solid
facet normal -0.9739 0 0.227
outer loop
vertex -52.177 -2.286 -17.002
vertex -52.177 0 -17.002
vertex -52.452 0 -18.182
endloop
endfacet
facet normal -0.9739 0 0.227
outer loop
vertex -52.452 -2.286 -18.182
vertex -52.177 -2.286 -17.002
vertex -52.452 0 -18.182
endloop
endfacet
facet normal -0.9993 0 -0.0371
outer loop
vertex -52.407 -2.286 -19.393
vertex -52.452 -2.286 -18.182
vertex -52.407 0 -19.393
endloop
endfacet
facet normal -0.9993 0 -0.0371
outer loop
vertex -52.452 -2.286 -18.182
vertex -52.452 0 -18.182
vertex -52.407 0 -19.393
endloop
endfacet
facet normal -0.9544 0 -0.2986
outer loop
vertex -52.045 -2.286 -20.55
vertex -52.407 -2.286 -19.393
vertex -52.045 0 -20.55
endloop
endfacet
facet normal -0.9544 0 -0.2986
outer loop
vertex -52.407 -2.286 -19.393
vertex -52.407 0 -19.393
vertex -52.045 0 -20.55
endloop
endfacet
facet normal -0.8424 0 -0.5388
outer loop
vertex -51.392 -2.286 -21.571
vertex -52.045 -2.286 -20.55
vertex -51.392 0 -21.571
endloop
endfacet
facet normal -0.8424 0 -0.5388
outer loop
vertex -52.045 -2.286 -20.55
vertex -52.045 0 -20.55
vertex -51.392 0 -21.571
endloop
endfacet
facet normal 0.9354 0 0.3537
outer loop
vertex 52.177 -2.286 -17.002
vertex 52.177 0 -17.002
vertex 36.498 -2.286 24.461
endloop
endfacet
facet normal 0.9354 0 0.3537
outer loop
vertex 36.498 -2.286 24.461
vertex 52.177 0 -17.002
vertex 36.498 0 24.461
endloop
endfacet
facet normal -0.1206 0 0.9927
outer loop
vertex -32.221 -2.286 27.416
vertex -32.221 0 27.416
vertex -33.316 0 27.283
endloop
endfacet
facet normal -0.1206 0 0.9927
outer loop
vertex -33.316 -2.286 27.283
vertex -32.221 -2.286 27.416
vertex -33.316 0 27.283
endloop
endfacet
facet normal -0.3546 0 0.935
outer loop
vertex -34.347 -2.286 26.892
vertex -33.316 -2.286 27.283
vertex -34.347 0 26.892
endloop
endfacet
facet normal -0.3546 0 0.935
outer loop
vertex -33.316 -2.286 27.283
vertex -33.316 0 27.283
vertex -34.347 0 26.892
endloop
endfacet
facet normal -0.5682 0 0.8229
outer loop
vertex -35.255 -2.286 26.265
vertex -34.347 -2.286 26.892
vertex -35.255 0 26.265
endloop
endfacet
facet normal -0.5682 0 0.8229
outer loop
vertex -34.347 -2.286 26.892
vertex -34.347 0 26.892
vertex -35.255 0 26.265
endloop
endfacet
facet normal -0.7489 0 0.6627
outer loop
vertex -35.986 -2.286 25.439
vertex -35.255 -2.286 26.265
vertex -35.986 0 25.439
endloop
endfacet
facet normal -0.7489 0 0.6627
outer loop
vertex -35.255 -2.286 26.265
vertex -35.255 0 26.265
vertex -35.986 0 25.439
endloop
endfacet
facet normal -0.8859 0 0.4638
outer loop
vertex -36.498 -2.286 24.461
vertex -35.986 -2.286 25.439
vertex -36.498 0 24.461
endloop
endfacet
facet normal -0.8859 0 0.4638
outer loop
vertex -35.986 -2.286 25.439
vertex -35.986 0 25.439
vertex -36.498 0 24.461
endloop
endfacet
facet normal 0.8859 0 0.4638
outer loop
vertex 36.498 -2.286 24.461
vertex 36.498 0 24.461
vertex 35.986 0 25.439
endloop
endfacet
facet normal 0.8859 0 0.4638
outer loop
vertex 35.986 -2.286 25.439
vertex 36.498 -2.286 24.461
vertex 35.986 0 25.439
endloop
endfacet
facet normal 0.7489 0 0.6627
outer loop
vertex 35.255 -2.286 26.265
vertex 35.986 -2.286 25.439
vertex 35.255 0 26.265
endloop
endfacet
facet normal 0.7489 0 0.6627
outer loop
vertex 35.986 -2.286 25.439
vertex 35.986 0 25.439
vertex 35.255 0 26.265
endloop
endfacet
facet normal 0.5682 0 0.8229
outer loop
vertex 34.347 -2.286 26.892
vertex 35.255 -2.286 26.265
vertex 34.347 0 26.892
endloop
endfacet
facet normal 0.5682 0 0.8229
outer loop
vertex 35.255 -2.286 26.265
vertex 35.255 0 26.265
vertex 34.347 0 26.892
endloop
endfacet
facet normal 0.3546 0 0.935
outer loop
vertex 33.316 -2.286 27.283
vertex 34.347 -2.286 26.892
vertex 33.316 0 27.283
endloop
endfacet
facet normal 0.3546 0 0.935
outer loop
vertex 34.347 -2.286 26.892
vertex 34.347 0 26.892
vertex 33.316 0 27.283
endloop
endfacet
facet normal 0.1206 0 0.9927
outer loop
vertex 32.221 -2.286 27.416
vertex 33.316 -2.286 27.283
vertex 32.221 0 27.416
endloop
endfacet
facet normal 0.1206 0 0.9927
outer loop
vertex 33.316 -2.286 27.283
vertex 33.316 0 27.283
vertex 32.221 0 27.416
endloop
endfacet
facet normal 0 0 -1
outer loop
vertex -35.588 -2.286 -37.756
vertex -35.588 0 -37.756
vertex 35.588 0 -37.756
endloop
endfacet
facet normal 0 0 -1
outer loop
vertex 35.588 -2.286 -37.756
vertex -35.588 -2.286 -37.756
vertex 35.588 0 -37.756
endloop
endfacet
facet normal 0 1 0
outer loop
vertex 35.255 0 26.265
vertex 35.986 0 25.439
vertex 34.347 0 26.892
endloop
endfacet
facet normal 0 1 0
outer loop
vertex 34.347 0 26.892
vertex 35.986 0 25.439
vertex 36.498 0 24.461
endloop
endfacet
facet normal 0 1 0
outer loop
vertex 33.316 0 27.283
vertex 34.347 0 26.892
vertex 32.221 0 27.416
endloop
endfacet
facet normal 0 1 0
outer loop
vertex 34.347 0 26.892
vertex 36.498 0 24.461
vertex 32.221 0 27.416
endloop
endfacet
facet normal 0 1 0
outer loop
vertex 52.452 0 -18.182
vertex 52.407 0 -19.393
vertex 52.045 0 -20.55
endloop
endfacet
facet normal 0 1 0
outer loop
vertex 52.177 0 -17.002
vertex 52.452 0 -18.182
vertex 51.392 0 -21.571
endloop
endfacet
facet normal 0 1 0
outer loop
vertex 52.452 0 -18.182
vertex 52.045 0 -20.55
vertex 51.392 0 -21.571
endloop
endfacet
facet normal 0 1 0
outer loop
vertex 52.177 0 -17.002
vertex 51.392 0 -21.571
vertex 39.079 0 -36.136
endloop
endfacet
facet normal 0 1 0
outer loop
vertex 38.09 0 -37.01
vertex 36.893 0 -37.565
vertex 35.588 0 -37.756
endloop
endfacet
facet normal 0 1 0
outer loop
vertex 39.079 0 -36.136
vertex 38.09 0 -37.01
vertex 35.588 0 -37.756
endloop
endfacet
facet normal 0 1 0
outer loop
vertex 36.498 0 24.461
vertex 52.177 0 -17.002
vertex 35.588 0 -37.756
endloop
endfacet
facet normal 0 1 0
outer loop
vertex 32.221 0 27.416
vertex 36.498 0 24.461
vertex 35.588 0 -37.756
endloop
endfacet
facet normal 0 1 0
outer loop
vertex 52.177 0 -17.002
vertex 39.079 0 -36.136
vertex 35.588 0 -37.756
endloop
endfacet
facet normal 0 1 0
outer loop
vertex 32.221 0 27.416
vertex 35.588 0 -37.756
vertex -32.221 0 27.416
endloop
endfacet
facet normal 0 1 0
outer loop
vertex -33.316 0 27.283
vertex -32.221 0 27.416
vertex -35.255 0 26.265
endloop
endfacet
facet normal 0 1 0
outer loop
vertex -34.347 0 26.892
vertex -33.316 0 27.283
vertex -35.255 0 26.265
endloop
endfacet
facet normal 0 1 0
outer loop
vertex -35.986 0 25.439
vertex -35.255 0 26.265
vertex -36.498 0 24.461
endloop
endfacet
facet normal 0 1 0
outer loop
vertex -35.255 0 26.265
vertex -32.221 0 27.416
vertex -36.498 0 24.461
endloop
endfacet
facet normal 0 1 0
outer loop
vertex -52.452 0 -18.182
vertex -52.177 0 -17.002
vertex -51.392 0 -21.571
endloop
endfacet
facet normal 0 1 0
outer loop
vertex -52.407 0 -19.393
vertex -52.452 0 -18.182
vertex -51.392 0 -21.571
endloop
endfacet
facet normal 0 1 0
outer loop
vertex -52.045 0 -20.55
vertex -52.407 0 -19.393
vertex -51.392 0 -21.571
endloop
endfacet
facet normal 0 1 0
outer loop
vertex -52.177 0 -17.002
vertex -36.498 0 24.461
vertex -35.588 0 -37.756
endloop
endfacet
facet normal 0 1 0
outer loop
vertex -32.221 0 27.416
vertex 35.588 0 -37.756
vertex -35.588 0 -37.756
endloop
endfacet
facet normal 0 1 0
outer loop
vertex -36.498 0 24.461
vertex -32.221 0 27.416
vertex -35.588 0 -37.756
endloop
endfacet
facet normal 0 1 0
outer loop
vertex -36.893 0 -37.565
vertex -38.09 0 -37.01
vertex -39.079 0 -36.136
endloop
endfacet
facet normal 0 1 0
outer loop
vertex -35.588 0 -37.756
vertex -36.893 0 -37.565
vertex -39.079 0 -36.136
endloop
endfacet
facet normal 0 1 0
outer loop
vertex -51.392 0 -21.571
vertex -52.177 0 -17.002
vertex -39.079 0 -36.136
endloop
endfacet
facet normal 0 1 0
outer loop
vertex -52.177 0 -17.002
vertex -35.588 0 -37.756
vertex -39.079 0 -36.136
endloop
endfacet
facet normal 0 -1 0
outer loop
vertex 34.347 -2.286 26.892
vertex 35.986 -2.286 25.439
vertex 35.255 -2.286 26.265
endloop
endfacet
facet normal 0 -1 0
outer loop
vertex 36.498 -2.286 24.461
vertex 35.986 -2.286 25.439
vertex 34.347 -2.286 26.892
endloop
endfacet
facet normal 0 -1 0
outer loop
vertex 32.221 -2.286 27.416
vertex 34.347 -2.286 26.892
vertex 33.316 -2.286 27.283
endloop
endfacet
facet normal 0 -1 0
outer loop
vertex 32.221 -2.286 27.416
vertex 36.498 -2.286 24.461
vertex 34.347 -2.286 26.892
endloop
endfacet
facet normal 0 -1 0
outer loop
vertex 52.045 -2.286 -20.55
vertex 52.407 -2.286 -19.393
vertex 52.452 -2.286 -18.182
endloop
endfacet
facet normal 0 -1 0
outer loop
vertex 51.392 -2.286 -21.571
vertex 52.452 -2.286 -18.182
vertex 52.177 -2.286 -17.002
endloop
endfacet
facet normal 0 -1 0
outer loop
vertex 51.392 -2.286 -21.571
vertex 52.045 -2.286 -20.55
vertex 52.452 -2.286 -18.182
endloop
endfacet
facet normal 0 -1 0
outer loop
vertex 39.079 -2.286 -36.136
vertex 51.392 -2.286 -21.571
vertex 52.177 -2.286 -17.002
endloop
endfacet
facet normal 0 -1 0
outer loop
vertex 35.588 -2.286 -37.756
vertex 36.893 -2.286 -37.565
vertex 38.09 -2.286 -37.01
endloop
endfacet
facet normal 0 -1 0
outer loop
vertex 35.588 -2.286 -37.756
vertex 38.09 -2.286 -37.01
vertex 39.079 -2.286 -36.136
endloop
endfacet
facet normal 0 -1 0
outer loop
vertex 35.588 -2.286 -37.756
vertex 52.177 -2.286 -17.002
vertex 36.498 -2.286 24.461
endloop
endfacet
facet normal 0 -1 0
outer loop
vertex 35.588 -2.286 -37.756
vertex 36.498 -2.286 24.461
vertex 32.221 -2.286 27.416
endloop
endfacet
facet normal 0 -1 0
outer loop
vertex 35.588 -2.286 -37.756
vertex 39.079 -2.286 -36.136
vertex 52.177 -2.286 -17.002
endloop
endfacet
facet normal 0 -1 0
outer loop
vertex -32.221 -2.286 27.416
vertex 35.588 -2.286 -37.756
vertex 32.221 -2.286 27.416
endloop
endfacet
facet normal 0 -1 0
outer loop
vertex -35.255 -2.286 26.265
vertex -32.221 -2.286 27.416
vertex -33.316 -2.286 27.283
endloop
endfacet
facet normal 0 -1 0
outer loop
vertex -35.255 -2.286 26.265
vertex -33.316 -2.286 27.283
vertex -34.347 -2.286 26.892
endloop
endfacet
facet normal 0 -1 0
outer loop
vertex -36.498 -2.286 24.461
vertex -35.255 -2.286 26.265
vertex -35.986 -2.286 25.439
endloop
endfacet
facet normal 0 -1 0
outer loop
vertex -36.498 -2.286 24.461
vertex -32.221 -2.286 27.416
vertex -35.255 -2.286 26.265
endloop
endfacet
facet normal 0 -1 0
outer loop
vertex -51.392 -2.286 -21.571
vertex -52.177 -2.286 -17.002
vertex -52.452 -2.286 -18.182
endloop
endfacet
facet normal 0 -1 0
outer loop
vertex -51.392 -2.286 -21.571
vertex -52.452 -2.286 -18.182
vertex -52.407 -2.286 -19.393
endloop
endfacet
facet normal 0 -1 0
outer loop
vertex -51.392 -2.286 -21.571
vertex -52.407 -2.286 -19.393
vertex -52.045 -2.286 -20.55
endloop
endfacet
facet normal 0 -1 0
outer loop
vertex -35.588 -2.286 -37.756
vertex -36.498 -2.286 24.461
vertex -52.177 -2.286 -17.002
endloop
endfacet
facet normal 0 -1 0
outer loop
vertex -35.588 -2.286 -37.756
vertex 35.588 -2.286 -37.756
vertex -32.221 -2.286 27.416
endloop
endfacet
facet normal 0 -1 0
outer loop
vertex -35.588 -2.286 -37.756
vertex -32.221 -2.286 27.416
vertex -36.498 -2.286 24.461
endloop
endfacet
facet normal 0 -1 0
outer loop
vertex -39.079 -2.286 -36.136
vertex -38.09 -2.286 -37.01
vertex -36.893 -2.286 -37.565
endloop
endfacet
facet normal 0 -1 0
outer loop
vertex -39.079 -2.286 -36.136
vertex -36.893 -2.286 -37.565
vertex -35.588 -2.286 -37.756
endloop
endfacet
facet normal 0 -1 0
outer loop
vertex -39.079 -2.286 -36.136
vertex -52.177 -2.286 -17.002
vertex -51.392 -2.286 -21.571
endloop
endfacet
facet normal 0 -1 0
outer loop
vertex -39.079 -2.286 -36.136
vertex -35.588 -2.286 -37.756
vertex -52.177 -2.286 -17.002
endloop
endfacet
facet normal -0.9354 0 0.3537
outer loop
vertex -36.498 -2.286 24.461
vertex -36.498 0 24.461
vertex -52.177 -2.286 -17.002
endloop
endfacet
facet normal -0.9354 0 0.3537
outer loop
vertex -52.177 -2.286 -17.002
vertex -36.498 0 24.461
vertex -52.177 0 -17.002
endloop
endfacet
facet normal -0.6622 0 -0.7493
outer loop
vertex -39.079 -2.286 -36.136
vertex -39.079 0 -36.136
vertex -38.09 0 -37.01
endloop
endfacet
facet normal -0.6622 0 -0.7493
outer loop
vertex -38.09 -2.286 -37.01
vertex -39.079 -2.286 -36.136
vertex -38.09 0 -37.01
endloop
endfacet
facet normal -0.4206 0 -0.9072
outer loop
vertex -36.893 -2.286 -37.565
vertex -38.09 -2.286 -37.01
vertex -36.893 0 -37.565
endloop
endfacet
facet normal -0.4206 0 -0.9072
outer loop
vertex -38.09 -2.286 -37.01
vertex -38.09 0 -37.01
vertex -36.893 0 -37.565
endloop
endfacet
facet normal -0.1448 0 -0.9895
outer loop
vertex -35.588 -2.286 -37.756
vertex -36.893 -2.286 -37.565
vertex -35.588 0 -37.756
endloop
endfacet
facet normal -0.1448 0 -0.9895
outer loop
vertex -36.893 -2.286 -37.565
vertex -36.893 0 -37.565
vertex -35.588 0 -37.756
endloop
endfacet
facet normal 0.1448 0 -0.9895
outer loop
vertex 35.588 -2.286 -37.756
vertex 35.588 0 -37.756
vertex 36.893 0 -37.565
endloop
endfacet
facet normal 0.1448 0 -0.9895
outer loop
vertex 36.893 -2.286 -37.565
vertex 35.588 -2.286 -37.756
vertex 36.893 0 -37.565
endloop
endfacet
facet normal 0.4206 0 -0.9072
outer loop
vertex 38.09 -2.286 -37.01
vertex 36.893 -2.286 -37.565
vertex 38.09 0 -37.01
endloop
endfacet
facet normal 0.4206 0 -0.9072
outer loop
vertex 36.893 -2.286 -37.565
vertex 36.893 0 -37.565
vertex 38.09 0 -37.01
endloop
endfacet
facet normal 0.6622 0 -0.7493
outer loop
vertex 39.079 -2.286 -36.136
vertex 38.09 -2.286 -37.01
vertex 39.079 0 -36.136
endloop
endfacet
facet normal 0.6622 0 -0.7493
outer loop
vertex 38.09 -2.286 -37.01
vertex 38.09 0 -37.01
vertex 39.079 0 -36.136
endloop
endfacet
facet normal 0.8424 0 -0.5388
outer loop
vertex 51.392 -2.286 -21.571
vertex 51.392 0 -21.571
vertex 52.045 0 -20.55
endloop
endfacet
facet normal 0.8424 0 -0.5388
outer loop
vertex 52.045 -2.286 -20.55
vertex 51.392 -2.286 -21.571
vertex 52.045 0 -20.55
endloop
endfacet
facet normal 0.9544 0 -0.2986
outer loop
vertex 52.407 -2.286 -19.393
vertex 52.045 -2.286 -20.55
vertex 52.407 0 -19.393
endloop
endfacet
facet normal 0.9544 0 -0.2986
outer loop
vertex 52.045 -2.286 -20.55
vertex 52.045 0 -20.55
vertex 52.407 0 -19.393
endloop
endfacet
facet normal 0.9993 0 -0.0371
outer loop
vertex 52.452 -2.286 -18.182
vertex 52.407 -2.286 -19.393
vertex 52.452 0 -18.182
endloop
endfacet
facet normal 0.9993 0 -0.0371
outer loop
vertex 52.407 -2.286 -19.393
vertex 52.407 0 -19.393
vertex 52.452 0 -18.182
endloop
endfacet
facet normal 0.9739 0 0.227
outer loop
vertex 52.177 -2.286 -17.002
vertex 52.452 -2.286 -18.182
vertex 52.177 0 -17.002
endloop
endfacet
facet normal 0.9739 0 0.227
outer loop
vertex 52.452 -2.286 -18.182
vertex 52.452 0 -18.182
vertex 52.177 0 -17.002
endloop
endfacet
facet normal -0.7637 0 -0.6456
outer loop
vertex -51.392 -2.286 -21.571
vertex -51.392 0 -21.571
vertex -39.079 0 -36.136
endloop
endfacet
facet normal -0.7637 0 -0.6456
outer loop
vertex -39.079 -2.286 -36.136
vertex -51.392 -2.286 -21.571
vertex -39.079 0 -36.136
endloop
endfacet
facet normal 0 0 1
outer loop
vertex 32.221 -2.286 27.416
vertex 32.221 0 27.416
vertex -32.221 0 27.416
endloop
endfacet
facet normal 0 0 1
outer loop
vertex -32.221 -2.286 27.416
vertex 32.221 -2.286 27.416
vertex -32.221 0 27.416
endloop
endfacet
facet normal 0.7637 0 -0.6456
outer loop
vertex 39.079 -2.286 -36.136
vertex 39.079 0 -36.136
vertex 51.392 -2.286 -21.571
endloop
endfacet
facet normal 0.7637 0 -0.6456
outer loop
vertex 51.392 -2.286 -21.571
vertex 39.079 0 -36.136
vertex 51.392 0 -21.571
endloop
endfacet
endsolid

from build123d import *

# Parameters (mm, degrees)
EXTRUDE1_DEPTH = 2.286


with BuildPart() as part:
    # Sketch1 → Extrude1 (new body)
    with BuildSketch(Plane(origin=(0, 0, 0), x_dir=(1, 0, 0), z_dir=(0, 1, 0))):
        with BuildLine():
            Line((-35.587506478, 37.75591133), (35.587506478, 37.75591133))
            ThreePointArc((35.587506478, 37.75591133), (37.512064818, 37.331110288), (39.078987817, 36.135646762))
            Line((39.078987817, 36.135646762), (51.39211015, 21.570982059))
            ThreePointArc((51.39211015, 21.570982059), (52.406608959, 19.393408694), (52.177078973, 17.002101608))
            Line((52.177078973, 17.002101608), (36.497605157, -24.461395817))
            ThreePointArc((36.497605157, -24.461395817), (34.820154512, -26.605684768), (32.221154995, -27.416250797))
            Line((32.221154995, -27.416250797), (-32.221154995, -27.416250797))
            ThreePointArc((-32.221154995, -27.416250797), (-34.820154512, -26.605684768), (-36.497605157, -24.461395817))
            Line((-36.497605157, -24.461395817), (-52.177078973, 17.002101608))
            ThreePointArc((-52.177078973, 17.002101608), (-52.406608959, 19.393408694), (-51.39211015, 21.570982059))
            Line((-51.39211015, 21.570982059), (-39.078987817, 36.135646762))
            ThreePointArc((-39.078987817, 36.135646762), (-37.512064818, 37.331110288), (-35.587506478, 37.75591133))
        make_face()
    extrude(amount=-EXTRUDE1_DEPTH)


solid = part.part
